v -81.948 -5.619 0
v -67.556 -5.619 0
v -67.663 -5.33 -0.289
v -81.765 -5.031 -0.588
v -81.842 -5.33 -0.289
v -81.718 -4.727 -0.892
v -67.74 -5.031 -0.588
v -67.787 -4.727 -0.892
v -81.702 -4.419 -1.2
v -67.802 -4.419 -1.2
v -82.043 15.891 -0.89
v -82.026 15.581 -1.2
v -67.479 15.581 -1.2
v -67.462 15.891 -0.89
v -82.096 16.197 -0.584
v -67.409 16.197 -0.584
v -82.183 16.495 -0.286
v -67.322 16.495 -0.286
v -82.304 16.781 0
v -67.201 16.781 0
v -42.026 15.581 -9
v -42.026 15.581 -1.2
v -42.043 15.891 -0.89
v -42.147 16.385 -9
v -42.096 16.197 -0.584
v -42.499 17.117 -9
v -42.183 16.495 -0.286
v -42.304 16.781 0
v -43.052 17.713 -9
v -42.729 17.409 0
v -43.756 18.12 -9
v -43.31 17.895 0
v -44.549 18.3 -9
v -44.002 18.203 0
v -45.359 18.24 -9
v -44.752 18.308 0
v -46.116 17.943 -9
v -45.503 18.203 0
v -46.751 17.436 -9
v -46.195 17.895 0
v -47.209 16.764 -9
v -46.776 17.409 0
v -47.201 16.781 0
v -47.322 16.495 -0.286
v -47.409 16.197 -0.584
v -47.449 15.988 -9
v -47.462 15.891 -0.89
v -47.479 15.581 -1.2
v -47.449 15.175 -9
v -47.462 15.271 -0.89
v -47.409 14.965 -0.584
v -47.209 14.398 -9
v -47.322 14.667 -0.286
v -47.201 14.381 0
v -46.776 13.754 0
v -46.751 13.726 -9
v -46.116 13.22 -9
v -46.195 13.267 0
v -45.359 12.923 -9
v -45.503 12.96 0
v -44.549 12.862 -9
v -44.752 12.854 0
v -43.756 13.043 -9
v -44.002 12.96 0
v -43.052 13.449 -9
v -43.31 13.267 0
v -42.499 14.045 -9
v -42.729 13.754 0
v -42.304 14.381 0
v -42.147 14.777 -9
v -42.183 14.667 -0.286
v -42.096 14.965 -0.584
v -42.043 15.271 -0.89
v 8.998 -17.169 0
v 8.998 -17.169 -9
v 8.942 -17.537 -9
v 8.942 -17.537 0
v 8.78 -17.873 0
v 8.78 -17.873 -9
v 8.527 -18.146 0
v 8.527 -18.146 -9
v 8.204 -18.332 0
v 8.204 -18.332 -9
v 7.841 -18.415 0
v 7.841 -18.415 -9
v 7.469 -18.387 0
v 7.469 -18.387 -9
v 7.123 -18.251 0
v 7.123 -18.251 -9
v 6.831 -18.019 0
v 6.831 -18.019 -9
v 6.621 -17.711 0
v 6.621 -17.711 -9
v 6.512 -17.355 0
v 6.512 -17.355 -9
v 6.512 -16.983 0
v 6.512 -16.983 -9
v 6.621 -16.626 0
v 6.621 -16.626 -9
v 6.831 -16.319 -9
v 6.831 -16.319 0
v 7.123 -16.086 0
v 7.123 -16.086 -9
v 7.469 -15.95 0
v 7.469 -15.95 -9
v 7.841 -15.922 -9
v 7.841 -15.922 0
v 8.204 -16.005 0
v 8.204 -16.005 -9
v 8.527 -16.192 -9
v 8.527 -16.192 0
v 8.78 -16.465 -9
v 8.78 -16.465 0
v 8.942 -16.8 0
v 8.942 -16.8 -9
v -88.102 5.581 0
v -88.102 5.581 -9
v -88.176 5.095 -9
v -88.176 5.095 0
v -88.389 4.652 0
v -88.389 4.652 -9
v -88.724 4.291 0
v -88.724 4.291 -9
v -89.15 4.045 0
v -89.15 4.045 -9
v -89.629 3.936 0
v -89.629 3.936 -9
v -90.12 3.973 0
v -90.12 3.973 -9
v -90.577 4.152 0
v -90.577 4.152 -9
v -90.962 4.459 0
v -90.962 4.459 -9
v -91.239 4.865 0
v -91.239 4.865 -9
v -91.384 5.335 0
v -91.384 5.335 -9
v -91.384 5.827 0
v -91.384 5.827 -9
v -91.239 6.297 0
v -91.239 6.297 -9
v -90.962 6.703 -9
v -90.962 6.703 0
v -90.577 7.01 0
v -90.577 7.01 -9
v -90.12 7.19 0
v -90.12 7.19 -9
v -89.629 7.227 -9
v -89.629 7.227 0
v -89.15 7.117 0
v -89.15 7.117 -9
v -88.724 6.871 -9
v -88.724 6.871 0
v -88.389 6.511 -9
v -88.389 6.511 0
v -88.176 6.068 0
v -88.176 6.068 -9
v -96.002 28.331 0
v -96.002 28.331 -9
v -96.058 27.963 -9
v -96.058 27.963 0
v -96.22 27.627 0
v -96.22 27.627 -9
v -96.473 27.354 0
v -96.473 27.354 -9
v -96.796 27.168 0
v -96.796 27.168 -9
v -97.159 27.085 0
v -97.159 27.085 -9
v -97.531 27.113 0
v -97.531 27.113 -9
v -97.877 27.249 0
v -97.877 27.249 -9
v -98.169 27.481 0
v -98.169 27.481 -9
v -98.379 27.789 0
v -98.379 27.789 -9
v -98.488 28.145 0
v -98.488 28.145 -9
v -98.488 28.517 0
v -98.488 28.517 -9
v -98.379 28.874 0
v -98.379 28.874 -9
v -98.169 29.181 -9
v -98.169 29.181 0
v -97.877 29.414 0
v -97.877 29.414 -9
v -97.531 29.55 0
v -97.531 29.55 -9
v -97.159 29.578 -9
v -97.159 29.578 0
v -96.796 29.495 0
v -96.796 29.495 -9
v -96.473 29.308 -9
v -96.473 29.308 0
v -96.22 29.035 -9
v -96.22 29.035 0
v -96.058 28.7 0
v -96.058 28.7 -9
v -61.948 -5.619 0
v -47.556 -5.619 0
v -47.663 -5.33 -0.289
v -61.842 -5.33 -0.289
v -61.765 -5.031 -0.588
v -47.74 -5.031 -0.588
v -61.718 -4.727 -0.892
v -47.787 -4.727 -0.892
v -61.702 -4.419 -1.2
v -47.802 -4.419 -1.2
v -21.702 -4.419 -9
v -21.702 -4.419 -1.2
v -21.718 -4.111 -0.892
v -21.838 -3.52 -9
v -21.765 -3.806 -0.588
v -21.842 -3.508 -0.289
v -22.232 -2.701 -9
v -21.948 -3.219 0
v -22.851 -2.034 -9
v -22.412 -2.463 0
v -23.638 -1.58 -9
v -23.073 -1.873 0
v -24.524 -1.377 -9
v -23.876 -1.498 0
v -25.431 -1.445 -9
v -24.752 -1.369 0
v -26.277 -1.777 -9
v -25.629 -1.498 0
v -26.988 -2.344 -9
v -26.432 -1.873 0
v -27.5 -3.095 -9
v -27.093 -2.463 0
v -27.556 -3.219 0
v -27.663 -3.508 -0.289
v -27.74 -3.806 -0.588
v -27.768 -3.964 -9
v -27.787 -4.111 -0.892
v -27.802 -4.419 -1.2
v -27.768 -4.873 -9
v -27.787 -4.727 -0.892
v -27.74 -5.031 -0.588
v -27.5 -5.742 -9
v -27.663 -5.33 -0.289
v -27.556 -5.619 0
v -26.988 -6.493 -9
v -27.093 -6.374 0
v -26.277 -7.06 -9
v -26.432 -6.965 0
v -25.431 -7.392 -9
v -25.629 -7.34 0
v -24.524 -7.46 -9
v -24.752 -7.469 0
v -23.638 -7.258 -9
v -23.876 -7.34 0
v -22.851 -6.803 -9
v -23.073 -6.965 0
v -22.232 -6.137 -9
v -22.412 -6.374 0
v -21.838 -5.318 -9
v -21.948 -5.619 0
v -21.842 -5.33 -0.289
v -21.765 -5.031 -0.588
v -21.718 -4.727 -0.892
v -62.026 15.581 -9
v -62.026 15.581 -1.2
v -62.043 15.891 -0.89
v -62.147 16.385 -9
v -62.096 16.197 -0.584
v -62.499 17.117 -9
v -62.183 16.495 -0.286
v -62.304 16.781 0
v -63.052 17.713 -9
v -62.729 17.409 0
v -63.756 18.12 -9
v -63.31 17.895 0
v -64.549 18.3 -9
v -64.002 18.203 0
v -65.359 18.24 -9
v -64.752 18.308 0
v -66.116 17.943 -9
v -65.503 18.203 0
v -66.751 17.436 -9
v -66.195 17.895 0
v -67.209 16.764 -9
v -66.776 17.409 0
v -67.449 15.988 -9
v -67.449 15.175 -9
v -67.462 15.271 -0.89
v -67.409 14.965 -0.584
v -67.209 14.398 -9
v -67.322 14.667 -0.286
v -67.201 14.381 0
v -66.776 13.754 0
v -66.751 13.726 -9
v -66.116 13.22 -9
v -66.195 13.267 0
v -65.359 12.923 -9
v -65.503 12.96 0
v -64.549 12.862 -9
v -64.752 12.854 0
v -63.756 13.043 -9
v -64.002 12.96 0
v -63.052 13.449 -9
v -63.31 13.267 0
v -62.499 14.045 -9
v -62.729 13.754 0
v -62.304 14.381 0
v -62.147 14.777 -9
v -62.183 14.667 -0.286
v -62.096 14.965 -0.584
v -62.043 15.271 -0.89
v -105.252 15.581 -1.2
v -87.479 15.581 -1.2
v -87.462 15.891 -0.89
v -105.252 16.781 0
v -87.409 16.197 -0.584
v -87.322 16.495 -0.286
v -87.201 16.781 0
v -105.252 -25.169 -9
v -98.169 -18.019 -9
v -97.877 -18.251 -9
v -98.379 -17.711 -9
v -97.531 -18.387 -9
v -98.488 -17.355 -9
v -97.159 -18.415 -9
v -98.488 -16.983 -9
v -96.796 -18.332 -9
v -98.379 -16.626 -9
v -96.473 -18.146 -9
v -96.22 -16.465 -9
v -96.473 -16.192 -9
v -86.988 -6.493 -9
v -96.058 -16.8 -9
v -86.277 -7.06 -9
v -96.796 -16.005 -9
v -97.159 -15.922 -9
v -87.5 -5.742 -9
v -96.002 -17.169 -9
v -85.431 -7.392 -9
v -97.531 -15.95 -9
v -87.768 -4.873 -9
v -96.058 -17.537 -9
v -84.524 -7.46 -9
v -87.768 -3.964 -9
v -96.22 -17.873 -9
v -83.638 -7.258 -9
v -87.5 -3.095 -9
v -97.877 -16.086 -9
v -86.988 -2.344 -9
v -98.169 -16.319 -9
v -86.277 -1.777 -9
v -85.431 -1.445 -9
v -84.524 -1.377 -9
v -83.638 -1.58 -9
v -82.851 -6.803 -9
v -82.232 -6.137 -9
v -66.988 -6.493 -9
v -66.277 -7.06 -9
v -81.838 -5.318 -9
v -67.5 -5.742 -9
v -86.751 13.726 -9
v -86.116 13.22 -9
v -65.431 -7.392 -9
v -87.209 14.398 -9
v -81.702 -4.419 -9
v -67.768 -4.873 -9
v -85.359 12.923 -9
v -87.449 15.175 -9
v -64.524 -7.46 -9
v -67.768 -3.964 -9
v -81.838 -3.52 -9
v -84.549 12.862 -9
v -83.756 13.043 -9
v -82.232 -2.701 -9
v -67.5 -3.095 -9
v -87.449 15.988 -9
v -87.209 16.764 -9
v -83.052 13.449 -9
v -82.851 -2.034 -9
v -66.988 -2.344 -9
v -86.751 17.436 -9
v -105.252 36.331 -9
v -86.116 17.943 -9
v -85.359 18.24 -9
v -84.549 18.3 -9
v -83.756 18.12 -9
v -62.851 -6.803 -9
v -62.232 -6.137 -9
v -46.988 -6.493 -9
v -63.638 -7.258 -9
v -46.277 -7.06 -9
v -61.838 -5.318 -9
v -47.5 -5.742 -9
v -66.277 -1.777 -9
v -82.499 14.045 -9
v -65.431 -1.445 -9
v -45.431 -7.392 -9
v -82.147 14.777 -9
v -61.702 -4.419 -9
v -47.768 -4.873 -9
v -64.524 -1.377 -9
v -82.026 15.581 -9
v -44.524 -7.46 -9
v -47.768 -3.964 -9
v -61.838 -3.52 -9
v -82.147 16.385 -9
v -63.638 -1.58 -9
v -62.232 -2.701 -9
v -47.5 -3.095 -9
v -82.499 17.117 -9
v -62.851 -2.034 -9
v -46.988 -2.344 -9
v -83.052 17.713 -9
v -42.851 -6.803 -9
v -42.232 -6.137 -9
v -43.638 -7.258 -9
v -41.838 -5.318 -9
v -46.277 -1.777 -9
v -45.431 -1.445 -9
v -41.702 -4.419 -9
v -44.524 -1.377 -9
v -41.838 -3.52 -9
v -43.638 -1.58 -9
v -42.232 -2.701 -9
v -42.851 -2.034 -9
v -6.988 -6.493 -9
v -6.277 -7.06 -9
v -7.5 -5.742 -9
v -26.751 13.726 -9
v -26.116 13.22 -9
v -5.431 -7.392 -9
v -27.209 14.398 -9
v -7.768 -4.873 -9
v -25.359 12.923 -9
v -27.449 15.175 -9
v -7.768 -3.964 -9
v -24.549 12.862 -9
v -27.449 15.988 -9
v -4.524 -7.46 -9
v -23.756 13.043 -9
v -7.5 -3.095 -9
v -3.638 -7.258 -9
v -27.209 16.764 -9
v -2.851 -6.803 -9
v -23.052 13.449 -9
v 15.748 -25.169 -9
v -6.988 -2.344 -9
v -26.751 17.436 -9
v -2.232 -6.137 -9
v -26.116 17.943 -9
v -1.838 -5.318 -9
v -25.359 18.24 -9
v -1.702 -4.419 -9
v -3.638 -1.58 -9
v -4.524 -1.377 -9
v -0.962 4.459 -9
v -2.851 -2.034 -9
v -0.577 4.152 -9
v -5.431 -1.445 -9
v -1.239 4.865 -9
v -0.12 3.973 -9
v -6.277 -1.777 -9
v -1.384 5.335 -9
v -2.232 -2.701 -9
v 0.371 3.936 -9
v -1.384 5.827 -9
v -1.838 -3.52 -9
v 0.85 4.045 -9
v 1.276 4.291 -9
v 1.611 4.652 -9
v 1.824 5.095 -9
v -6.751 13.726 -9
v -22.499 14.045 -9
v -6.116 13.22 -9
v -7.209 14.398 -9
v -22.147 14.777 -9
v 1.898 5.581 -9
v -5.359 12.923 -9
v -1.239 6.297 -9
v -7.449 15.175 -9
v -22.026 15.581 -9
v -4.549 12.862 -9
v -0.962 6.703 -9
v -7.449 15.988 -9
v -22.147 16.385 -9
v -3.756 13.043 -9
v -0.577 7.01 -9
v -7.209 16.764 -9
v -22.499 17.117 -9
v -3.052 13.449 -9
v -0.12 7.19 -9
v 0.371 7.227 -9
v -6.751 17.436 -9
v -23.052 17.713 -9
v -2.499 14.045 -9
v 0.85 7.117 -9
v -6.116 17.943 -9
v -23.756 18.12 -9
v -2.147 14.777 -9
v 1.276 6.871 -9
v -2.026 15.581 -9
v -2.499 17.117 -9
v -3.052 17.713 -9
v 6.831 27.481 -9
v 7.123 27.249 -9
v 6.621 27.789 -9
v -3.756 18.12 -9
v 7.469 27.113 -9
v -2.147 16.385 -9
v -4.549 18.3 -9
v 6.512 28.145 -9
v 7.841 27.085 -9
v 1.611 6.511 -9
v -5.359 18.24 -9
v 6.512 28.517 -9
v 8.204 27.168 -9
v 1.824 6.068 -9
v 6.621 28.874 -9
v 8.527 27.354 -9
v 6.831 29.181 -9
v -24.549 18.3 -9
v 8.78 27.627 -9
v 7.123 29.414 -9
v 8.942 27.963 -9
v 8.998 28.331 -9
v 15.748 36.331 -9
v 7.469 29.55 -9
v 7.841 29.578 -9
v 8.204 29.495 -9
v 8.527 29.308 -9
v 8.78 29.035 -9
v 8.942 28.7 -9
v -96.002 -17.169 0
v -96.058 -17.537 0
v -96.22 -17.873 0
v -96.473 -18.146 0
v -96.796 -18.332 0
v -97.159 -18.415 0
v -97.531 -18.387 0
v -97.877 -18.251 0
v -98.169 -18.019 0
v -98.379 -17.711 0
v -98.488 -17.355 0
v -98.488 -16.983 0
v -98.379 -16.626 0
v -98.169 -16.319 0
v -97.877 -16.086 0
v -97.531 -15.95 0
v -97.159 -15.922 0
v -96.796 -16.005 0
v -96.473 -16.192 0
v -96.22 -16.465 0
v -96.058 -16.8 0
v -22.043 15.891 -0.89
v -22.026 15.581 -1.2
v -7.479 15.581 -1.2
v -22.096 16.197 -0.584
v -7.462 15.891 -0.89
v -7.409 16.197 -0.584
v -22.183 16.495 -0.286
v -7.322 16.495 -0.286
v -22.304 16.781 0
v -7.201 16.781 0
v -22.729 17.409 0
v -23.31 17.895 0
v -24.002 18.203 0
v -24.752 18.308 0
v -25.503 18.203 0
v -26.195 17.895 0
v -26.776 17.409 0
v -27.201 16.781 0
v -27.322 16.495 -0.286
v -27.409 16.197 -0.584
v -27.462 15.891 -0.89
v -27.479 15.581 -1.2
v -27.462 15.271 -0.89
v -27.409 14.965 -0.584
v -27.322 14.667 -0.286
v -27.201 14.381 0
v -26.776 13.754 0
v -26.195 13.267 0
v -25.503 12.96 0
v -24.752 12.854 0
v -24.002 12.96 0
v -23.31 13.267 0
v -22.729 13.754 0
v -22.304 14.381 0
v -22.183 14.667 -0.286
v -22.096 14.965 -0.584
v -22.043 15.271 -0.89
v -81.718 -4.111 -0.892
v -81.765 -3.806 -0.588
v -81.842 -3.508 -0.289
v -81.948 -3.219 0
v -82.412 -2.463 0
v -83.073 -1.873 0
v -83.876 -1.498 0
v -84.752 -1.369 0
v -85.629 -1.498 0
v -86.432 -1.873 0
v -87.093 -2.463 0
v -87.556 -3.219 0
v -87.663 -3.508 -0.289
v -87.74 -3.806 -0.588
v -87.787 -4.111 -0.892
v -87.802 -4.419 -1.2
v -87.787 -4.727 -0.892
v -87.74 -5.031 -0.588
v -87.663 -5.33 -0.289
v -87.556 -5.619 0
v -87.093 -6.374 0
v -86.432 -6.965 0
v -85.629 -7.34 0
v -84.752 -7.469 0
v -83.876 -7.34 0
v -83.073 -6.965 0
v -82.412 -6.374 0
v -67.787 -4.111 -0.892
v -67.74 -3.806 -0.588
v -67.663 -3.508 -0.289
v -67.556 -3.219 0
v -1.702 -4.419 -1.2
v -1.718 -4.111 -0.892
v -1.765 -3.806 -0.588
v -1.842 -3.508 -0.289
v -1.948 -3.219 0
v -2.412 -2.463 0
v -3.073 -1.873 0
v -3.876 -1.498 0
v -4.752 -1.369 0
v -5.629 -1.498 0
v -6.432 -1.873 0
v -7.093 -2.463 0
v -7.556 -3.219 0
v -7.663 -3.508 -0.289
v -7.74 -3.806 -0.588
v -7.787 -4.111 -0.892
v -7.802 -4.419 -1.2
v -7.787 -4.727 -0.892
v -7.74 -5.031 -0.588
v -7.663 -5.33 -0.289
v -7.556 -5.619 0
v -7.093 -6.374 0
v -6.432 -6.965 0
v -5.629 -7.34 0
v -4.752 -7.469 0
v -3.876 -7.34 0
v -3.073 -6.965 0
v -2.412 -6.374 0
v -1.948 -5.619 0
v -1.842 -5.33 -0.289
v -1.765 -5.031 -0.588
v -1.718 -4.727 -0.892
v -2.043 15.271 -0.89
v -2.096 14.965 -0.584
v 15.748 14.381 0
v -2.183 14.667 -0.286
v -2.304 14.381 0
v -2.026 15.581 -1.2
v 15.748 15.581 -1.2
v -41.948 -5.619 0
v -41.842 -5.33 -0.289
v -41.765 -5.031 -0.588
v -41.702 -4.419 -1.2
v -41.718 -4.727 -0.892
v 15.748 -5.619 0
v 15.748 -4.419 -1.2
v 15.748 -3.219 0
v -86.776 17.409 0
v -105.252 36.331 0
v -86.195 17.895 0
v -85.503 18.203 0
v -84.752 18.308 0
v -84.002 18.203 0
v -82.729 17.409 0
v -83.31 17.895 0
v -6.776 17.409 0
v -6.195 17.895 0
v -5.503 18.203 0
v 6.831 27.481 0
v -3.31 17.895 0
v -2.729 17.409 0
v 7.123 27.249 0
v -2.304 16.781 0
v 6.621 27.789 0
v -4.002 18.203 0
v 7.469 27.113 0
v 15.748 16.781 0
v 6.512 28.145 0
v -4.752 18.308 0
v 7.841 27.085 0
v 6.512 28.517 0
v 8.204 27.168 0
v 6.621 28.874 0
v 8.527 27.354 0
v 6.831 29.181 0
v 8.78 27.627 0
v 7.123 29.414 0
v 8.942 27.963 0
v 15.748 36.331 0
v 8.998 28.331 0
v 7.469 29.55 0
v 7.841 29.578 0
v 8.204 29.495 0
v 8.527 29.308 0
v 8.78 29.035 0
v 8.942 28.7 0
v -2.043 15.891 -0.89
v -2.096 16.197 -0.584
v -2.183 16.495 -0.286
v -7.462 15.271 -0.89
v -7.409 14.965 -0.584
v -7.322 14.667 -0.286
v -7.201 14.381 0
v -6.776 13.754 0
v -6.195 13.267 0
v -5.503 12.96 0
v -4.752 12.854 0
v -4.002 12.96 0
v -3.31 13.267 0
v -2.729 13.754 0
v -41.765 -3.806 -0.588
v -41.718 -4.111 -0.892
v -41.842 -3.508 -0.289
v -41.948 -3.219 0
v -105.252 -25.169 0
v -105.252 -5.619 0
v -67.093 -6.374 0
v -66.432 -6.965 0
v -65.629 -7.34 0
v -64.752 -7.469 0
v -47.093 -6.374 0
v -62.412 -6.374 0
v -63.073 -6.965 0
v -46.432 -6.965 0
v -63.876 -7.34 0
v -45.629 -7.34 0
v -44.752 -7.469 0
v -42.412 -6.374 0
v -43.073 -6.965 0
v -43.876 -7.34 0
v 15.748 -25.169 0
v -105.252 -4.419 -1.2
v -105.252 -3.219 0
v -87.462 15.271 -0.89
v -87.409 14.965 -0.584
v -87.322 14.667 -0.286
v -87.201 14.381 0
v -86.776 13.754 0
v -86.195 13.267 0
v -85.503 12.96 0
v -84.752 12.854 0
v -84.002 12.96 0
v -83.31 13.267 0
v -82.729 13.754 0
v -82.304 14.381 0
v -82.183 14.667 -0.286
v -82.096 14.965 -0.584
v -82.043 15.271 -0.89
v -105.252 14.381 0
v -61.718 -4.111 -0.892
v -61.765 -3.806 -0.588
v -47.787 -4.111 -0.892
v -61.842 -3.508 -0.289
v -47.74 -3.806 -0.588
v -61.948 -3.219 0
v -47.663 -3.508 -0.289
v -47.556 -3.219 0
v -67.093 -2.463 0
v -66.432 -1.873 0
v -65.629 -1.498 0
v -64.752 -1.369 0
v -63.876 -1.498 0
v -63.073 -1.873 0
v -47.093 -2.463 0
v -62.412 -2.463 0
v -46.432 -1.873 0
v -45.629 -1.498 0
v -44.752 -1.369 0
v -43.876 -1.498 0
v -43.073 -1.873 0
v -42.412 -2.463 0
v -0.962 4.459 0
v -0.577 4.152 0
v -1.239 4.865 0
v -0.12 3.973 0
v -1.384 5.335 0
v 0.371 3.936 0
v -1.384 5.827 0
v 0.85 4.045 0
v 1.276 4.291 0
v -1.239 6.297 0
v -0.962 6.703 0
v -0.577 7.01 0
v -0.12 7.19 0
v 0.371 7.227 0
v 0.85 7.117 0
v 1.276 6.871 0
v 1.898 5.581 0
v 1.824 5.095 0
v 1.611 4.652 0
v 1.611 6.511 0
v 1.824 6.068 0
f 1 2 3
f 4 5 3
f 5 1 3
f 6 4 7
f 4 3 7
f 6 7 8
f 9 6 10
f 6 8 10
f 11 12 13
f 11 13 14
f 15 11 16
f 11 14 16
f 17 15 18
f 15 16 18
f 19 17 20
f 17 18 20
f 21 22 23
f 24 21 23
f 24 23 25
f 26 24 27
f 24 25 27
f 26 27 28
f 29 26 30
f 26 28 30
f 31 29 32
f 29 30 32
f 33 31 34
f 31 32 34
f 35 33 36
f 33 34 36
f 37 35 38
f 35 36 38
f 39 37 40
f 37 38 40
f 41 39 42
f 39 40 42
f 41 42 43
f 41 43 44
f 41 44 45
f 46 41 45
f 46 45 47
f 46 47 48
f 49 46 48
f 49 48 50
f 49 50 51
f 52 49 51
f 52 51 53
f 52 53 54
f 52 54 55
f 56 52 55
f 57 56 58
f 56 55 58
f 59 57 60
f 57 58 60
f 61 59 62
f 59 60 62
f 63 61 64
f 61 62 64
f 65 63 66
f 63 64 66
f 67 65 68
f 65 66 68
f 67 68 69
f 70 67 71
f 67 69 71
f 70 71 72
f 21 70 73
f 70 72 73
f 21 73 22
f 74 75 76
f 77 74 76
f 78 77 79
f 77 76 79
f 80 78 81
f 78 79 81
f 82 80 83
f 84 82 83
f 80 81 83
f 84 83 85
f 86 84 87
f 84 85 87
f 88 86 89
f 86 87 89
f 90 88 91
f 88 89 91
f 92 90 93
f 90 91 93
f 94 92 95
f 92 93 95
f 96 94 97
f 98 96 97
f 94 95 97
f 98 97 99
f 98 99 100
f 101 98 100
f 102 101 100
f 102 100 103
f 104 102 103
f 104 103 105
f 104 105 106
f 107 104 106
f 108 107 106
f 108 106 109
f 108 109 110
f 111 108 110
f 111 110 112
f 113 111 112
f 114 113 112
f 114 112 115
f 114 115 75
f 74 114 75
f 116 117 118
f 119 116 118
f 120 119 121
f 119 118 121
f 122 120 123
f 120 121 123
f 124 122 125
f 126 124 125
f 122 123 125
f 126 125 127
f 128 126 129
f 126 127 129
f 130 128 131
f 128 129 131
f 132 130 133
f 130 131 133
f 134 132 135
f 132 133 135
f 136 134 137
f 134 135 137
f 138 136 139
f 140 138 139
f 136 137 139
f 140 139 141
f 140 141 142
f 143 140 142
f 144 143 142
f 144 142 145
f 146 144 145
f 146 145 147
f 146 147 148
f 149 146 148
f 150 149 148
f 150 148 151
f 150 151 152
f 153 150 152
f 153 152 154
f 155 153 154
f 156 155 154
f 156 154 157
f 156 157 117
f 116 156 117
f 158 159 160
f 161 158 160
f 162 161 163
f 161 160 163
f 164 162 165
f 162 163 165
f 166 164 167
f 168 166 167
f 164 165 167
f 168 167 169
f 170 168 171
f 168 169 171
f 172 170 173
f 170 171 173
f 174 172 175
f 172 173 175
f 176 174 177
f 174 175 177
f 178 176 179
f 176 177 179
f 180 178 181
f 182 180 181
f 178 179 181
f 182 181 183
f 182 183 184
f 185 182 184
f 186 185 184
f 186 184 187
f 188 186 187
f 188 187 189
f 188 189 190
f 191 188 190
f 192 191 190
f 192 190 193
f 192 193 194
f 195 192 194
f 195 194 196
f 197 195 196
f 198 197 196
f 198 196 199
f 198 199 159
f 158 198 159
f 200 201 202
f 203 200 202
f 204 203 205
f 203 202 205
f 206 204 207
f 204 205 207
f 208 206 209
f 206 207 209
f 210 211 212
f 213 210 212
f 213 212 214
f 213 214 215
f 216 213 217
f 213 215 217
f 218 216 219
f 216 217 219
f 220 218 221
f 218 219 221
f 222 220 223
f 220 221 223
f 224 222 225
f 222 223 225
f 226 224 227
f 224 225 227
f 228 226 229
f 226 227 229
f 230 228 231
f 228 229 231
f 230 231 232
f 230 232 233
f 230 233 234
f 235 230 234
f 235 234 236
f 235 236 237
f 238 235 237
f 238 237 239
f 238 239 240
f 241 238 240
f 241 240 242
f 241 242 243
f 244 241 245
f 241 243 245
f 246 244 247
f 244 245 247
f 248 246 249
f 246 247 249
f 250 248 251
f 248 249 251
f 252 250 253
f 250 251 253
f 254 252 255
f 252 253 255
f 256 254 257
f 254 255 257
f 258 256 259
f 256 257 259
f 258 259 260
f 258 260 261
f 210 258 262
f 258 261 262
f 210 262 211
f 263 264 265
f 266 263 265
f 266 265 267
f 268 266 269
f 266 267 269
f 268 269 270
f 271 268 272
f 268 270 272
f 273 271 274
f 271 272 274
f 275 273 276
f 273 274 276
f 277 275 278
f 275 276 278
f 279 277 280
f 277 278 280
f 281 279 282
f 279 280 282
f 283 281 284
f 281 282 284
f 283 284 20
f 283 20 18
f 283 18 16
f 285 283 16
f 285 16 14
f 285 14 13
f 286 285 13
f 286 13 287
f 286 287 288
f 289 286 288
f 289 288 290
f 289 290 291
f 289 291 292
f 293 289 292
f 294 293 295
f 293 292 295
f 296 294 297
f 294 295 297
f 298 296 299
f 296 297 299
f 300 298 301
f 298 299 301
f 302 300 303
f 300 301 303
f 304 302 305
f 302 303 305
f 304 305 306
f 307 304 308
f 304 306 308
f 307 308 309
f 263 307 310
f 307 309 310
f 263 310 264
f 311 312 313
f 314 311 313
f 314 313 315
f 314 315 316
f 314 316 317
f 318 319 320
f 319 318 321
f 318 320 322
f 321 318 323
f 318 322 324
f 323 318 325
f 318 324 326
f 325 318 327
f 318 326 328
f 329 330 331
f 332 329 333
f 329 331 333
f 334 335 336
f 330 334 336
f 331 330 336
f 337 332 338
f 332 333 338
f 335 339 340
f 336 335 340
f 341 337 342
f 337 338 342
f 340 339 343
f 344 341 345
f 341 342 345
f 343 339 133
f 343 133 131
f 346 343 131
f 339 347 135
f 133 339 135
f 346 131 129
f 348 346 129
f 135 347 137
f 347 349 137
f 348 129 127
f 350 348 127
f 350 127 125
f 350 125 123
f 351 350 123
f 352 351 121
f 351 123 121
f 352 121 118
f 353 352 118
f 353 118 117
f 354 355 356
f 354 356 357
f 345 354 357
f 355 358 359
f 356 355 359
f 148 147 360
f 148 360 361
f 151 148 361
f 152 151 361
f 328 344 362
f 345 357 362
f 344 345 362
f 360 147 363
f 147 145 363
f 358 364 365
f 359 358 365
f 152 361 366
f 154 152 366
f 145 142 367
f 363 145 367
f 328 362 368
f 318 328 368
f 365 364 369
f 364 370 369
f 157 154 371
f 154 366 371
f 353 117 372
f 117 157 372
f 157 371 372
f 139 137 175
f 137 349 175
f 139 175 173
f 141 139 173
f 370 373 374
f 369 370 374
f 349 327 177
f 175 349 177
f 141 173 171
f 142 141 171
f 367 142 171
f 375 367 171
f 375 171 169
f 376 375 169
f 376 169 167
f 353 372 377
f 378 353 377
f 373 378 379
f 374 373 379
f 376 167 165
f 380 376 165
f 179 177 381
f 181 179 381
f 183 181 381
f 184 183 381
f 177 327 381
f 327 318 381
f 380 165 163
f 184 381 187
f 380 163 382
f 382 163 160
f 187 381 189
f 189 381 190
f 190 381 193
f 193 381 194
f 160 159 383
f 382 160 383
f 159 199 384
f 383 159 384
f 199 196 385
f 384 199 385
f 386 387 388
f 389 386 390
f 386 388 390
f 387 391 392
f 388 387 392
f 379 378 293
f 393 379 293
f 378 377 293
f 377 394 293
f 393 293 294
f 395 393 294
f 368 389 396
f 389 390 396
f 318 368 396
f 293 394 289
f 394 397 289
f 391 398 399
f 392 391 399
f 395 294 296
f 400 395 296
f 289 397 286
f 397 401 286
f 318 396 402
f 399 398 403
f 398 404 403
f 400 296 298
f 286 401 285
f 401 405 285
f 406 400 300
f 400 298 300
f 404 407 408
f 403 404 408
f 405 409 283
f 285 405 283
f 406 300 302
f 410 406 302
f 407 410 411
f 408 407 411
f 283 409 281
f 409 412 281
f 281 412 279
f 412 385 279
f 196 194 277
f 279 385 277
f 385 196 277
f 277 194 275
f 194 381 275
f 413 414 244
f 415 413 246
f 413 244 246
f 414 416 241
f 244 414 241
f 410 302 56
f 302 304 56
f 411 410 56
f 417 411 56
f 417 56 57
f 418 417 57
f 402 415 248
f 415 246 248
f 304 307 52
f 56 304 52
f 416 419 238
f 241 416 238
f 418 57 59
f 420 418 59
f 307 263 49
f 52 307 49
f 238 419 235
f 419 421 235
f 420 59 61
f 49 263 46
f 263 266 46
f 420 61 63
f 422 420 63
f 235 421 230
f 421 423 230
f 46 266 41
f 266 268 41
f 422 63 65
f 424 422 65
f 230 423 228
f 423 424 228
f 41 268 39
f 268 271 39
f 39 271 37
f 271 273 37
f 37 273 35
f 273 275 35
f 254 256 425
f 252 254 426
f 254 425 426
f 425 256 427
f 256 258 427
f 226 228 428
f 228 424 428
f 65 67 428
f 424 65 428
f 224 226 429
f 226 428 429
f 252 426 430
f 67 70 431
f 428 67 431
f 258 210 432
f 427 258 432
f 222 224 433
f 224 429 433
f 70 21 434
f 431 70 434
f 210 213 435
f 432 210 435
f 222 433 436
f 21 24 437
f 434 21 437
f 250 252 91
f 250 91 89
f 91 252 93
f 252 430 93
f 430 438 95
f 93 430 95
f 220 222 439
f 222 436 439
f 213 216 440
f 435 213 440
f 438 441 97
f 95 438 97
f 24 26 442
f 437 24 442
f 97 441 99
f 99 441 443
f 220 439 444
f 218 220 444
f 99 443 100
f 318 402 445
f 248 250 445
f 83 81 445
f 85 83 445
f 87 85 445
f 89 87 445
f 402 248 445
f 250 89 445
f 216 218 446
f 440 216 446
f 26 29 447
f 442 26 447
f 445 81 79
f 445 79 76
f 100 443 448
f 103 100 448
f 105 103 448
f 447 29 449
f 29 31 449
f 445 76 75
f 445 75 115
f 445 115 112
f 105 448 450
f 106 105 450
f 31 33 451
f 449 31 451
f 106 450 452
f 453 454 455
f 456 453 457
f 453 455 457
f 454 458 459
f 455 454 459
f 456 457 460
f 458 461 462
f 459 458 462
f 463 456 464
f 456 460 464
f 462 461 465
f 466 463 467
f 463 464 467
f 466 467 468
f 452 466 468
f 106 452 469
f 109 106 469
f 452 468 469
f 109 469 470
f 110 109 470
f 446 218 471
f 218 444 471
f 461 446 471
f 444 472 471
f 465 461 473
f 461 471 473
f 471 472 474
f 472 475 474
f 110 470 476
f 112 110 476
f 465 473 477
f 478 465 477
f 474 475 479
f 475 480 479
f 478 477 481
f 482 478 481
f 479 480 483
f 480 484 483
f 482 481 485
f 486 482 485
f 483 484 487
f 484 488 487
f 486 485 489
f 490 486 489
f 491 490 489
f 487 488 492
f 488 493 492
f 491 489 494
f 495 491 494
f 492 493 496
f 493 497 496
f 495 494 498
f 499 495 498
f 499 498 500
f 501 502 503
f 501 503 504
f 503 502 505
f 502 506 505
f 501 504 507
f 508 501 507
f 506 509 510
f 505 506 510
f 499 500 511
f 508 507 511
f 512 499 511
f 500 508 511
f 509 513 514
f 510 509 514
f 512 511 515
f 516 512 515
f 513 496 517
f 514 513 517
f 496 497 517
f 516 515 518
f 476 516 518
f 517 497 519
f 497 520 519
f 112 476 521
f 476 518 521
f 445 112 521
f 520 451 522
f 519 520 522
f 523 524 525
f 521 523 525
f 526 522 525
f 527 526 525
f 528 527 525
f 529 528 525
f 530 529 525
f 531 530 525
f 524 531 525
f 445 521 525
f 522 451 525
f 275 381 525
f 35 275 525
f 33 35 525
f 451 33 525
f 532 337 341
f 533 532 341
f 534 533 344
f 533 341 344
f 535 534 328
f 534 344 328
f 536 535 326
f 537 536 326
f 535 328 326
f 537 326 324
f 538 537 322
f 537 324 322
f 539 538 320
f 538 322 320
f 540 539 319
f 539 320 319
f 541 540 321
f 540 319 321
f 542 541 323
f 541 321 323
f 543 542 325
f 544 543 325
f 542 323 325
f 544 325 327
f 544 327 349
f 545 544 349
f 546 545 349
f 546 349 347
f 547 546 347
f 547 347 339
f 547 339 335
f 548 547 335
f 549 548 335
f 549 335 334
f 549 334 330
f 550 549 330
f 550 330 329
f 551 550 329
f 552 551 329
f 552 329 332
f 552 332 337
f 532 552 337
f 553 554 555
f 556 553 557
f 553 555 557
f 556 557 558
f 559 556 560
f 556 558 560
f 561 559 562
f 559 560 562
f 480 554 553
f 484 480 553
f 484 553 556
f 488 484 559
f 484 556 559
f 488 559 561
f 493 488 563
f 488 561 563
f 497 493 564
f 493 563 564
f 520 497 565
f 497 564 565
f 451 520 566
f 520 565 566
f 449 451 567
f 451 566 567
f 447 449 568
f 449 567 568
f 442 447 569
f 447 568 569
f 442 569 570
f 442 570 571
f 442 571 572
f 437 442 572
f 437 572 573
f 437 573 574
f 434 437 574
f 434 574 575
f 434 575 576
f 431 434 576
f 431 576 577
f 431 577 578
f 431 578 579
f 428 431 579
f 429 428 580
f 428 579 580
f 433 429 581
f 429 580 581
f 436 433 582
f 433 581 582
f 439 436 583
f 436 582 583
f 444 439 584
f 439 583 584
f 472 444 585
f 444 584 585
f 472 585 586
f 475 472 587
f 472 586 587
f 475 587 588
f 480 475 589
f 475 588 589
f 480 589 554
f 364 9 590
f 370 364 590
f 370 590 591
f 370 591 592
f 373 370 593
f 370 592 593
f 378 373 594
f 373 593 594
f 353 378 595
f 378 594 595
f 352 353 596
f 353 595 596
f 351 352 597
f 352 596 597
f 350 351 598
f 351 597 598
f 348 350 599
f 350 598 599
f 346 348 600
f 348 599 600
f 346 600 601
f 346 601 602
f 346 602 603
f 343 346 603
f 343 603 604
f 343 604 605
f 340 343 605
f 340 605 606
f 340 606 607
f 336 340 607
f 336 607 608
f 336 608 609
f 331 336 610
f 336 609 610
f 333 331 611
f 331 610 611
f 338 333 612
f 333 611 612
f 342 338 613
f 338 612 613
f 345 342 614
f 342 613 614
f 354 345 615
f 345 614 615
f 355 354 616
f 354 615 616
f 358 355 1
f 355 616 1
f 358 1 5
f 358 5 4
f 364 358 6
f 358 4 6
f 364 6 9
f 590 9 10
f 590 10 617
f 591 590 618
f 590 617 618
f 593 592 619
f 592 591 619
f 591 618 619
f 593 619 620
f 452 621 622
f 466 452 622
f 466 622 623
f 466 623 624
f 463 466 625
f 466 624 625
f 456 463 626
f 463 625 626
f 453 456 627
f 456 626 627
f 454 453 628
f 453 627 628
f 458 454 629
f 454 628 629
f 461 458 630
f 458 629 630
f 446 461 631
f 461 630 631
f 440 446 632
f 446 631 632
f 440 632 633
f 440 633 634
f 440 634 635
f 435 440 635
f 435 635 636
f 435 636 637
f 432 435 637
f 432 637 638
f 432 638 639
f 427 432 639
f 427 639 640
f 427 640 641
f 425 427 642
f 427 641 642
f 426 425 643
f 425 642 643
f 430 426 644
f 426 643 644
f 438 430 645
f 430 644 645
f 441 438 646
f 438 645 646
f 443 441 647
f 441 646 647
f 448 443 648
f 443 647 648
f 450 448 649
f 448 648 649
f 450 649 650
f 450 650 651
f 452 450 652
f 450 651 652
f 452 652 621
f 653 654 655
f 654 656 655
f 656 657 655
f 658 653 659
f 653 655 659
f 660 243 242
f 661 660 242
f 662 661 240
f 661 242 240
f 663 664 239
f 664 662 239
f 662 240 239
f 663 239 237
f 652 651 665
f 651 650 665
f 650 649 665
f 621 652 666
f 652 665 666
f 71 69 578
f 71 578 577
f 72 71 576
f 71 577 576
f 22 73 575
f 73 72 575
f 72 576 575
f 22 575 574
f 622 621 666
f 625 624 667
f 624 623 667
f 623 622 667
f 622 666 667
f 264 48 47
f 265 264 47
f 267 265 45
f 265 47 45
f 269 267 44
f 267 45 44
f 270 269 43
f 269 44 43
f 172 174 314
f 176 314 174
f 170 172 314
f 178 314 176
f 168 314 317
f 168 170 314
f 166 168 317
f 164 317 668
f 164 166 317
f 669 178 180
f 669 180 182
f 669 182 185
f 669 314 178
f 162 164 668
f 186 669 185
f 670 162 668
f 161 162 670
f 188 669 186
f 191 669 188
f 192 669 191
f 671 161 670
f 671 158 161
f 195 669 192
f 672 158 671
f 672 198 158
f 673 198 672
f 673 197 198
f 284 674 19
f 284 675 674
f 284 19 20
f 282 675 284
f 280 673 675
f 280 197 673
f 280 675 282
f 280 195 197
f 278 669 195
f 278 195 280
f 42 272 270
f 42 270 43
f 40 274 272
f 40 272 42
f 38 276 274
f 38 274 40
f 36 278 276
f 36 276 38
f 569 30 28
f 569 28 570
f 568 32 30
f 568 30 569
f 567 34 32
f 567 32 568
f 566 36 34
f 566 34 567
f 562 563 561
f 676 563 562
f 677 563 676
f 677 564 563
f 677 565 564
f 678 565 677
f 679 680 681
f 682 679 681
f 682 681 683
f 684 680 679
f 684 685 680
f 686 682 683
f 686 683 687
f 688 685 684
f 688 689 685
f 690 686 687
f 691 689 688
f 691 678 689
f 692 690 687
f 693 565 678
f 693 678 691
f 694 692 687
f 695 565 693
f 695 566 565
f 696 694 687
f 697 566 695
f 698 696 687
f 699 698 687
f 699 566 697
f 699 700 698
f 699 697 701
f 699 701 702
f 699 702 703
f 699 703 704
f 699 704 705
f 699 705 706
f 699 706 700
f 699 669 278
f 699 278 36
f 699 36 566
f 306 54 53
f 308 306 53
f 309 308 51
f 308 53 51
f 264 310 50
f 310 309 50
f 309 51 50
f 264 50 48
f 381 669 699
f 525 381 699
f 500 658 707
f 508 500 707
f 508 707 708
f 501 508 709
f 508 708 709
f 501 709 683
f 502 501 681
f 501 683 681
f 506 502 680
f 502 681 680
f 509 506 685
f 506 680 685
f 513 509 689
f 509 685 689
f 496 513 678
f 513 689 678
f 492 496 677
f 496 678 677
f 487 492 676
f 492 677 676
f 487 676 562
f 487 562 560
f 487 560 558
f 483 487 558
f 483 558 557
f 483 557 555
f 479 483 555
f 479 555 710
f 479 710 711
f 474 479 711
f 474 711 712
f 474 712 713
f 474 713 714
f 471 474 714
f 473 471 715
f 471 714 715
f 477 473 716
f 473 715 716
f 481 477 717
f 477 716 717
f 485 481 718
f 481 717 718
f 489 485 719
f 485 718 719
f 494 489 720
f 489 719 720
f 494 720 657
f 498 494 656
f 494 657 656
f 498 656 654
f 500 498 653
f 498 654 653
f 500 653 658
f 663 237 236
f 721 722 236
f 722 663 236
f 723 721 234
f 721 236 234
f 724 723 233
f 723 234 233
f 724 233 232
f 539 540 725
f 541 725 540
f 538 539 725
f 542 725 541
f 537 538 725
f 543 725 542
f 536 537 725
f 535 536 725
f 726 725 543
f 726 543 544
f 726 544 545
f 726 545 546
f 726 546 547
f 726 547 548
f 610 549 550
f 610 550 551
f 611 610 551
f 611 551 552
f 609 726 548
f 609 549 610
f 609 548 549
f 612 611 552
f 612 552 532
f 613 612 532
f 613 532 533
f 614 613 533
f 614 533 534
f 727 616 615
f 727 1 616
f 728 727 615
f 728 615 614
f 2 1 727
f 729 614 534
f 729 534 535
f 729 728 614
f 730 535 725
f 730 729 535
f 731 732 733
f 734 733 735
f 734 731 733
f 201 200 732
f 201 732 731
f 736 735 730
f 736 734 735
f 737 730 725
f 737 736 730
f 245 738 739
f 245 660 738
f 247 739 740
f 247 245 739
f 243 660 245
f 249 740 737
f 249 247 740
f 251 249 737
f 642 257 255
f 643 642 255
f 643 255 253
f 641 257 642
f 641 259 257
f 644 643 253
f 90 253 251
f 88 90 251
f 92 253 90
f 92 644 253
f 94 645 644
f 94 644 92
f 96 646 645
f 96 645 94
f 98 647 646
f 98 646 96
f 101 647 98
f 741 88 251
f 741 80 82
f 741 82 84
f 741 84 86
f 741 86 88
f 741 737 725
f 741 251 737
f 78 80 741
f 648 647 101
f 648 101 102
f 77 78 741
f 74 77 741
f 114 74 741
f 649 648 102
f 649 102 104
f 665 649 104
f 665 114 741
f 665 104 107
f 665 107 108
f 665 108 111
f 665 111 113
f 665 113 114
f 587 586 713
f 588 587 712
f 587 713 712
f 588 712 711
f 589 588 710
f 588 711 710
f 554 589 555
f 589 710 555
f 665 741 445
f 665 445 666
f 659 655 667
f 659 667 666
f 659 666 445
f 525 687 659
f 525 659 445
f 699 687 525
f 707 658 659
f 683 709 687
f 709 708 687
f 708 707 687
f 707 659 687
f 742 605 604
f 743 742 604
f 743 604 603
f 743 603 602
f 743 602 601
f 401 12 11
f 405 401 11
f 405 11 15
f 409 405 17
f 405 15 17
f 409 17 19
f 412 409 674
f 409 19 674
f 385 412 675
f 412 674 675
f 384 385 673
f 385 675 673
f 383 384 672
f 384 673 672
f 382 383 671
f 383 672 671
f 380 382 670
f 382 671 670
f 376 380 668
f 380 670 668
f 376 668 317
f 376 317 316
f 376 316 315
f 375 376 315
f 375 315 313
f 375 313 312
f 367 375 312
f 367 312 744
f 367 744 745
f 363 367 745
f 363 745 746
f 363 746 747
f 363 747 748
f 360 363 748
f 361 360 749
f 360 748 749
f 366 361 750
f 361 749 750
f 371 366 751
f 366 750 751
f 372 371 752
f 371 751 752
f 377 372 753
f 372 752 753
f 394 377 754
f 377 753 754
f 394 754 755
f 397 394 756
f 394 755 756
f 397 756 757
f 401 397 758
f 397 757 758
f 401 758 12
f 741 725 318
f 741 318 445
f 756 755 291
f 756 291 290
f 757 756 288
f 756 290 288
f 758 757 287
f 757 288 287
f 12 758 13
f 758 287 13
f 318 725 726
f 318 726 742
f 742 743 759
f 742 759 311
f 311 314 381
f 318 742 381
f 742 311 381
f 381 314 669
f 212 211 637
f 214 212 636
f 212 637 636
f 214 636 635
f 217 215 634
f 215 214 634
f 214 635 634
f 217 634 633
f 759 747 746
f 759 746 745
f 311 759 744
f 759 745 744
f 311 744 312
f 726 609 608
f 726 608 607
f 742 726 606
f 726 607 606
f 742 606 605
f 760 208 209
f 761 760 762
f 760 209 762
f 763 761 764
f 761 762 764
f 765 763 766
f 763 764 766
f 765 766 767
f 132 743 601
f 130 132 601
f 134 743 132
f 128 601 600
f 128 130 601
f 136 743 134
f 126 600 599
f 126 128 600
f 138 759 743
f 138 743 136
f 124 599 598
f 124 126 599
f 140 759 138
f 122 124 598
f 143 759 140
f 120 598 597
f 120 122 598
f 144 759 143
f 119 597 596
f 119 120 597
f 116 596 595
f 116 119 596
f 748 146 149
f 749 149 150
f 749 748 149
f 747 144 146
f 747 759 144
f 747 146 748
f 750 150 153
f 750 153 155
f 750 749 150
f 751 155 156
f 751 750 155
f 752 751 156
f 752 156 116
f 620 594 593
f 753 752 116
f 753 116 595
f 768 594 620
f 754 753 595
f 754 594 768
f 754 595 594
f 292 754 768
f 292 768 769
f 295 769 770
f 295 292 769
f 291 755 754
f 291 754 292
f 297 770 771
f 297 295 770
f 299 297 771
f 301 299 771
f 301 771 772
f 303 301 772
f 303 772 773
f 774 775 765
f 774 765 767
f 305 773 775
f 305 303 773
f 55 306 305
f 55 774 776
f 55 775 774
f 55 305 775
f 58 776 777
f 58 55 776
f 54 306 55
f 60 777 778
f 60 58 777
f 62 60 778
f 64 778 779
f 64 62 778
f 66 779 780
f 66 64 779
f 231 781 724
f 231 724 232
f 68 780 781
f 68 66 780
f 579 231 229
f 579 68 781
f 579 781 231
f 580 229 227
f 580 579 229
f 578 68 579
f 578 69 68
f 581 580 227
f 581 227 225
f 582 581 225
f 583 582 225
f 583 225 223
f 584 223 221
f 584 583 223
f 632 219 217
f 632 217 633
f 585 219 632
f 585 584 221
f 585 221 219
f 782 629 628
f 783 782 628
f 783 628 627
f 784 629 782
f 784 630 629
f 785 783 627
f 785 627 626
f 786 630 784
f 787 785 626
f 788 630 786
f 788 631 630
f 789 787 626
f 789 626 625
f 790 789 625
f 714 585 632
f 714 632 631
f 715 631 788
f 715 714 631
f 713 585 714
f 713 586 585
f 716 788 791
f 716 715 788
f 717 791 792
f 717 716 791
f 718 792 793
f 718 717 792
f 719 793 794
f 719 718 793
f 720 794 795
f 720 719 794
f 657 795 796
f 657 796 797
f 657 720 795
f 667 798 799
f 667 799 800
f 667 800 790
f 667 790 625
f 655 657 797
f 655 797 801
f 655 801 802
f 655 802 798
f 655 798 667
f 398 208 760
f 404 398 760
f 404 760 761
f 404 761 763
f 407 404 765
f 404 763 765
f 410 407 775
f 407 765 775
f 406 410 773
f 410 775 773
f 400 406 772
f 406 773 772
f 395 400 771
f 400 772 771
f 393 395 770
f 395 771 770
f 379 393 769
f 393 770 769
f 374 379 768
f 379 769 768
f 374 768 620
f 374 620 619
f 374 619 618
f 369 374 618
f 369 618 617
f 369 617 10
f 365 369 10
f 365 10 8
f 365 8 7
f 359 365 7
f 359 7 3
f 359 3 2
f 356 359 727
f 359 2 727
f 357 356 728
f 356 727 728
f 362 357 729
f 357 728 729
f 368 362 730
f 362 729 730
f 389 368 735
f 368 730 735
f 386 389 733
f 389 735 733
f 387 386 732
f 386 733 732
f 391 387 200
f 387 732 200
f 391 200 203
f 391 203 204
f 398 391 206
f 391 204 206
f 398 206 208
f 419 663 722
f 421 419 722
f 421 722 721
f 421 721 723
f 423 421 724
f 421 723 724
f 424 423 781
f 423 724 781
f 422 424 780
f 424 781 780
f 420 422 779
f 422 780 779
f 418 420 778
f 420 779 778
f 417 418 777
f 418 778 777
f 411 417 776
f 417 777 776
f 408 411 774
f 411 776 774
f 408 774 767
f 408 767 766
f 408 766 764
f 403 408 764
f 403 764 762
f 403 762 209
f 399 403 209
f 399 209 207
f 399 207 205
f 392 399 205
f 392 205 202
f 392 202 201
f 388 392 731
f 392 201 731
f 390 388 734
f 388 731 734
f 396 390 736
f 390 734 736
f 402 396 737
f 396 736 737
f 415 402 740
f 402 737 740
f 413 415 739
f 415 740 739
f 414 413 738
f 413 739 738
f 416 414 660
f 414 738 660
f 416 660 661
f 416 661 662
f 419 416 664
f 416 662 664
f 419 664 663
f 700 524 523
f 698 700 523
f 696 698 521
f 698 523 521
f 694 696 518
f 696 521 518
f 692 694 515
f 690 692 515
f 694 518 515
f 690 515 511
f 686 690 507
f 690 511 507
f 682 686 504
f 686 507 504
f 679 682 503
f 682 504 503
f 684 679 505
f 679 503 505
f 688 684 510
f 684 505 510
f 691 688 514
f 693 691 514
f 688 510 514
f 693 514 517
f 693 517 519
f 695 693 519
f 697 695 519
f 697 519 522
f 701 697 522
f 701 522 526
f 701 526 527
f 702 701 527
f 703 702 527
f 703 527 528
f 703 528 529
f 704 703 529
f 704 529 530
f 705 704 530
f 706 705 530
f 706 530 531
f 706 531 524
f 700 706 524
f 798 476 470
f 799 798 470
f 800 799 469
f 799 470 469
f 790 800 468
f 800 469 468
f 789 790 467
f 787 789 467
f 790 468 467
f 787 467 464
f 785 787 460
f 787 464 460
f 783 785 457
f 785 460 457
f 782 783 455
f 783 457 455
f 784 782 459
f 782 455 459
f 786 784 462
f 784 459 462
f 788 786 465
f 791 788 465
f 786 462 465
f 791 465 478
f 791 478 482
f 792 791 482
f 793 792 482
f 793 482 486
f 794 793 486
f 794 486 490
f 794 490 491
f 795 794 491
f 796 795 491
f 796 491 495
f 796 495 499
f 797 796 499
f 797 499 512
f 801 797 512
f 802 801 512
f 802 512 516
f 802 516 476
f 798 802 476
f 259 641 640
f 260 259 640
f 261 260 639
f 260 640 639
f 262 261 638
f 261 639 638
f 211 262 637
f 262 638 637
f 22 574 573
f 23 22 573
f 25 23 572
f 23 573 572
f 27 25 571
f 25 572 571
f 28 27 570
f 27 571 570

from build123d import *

# Parameters (mm, degrees)
F0_W     = 121
F0_H     = 61.5
F1_DEPTH = 9
F2_R     = 2.726864
F2_R_2   = 3.05
F3_DEPTH = 10
F4_R     = 1.25
F5_DEPTH = 10
F6_R     = 1.65
F7_DEPTH = 10
F9_DEPTH = 125


with BuildPart() as f1:
    # F0 (on Top) → F1 (new body)
    with BuildSketch(Plane.XY):
        with Locations((-44.752393, 5.581188)):
            Rectangle(F0_W, F0_H)
    extrude(amount=-F1_DEPTH)

    # F2 (on face) → F3 (cut)
    with BuildSketch(Plane.XY):
        with Locations((-84.752393, 15.581188)):
            Circle(F2_R)
        with Locations((-84.752393, -4.418812)):
            Circle(F2_R_2)
        with Locations((-64.752393, 15.581188)):
            Circle(F2_R)
        with Locations((-64.752393, -4.418812)):
            Circle(F2_R_2)
        with Locations((-44.752393, 15.581188)):
            Circle(F2_R)
        with Locations((-44.752393, -4.418812)):
            Circle(F2_R_2)
        with Locations((-24.752393, 15.581188)):
            Circle(F2_R)
        with Locations((-24.752393, -4.418812)):
            Circle(F2_R_2)
        with Locations((-4.752393, 15.581188)):
            Circle(F2_R)
        with Locations((-4.752393, -4.418812)):
            Circle(F2_R_2)
    extrude(amount=-F3_DEPTH, mode=Mode.SUBTRACT)

    # F4 (on face) → F5 (cut)
    with BuildSketch(Plane(origin=(0, 0, -9), x_dir=(1, 0, 0), z_dir=(0, 0, -1))):
        with Locations((-97.252393, 17.168812)):
            Circle(F4_R)
        with Locations((-97.252393, -28.331188)):
            Circle(F4_R)
        with Locations((7.747607, 17.168812)):
            Circle(F4_R)
        with Locations((7.747607, -28.331188)):
            Circle(F4_R)
    extrude(amount=-F5_DEPTH, mode=Mode.SUBTRACT)

    # F6 (on face) → F7 (cut)
    with BuildSketch(Plane(origin=(0, 0, -9), x_dir=(1, 0, 0), z_dir=(0, 0, -1))):
        with Locations((-89.752393, -5.581188)):
            Circle(F6_R)
        with Locations((0.247607, -5.581188)):
            Circle(F6_R)
    extrude(amount=-F7_DEPTH, mode=Mode.SUBTRACT)

    # F8 (on face) → F9 (cut)
    with BuildSketch(Plane.YZ.offset(15.747607)):
        Polygon((-3.218812, 0), (-5.618812, 0), (-4.418812, -1.2), align=None)
        Polygon((16.781188, 0), (14.381188, 0), (15.581188, -1.2), align=None)
    extrude(amount=-F9_DEPTH, mode=Mode.SUBTRACT)


solid = f1.part
